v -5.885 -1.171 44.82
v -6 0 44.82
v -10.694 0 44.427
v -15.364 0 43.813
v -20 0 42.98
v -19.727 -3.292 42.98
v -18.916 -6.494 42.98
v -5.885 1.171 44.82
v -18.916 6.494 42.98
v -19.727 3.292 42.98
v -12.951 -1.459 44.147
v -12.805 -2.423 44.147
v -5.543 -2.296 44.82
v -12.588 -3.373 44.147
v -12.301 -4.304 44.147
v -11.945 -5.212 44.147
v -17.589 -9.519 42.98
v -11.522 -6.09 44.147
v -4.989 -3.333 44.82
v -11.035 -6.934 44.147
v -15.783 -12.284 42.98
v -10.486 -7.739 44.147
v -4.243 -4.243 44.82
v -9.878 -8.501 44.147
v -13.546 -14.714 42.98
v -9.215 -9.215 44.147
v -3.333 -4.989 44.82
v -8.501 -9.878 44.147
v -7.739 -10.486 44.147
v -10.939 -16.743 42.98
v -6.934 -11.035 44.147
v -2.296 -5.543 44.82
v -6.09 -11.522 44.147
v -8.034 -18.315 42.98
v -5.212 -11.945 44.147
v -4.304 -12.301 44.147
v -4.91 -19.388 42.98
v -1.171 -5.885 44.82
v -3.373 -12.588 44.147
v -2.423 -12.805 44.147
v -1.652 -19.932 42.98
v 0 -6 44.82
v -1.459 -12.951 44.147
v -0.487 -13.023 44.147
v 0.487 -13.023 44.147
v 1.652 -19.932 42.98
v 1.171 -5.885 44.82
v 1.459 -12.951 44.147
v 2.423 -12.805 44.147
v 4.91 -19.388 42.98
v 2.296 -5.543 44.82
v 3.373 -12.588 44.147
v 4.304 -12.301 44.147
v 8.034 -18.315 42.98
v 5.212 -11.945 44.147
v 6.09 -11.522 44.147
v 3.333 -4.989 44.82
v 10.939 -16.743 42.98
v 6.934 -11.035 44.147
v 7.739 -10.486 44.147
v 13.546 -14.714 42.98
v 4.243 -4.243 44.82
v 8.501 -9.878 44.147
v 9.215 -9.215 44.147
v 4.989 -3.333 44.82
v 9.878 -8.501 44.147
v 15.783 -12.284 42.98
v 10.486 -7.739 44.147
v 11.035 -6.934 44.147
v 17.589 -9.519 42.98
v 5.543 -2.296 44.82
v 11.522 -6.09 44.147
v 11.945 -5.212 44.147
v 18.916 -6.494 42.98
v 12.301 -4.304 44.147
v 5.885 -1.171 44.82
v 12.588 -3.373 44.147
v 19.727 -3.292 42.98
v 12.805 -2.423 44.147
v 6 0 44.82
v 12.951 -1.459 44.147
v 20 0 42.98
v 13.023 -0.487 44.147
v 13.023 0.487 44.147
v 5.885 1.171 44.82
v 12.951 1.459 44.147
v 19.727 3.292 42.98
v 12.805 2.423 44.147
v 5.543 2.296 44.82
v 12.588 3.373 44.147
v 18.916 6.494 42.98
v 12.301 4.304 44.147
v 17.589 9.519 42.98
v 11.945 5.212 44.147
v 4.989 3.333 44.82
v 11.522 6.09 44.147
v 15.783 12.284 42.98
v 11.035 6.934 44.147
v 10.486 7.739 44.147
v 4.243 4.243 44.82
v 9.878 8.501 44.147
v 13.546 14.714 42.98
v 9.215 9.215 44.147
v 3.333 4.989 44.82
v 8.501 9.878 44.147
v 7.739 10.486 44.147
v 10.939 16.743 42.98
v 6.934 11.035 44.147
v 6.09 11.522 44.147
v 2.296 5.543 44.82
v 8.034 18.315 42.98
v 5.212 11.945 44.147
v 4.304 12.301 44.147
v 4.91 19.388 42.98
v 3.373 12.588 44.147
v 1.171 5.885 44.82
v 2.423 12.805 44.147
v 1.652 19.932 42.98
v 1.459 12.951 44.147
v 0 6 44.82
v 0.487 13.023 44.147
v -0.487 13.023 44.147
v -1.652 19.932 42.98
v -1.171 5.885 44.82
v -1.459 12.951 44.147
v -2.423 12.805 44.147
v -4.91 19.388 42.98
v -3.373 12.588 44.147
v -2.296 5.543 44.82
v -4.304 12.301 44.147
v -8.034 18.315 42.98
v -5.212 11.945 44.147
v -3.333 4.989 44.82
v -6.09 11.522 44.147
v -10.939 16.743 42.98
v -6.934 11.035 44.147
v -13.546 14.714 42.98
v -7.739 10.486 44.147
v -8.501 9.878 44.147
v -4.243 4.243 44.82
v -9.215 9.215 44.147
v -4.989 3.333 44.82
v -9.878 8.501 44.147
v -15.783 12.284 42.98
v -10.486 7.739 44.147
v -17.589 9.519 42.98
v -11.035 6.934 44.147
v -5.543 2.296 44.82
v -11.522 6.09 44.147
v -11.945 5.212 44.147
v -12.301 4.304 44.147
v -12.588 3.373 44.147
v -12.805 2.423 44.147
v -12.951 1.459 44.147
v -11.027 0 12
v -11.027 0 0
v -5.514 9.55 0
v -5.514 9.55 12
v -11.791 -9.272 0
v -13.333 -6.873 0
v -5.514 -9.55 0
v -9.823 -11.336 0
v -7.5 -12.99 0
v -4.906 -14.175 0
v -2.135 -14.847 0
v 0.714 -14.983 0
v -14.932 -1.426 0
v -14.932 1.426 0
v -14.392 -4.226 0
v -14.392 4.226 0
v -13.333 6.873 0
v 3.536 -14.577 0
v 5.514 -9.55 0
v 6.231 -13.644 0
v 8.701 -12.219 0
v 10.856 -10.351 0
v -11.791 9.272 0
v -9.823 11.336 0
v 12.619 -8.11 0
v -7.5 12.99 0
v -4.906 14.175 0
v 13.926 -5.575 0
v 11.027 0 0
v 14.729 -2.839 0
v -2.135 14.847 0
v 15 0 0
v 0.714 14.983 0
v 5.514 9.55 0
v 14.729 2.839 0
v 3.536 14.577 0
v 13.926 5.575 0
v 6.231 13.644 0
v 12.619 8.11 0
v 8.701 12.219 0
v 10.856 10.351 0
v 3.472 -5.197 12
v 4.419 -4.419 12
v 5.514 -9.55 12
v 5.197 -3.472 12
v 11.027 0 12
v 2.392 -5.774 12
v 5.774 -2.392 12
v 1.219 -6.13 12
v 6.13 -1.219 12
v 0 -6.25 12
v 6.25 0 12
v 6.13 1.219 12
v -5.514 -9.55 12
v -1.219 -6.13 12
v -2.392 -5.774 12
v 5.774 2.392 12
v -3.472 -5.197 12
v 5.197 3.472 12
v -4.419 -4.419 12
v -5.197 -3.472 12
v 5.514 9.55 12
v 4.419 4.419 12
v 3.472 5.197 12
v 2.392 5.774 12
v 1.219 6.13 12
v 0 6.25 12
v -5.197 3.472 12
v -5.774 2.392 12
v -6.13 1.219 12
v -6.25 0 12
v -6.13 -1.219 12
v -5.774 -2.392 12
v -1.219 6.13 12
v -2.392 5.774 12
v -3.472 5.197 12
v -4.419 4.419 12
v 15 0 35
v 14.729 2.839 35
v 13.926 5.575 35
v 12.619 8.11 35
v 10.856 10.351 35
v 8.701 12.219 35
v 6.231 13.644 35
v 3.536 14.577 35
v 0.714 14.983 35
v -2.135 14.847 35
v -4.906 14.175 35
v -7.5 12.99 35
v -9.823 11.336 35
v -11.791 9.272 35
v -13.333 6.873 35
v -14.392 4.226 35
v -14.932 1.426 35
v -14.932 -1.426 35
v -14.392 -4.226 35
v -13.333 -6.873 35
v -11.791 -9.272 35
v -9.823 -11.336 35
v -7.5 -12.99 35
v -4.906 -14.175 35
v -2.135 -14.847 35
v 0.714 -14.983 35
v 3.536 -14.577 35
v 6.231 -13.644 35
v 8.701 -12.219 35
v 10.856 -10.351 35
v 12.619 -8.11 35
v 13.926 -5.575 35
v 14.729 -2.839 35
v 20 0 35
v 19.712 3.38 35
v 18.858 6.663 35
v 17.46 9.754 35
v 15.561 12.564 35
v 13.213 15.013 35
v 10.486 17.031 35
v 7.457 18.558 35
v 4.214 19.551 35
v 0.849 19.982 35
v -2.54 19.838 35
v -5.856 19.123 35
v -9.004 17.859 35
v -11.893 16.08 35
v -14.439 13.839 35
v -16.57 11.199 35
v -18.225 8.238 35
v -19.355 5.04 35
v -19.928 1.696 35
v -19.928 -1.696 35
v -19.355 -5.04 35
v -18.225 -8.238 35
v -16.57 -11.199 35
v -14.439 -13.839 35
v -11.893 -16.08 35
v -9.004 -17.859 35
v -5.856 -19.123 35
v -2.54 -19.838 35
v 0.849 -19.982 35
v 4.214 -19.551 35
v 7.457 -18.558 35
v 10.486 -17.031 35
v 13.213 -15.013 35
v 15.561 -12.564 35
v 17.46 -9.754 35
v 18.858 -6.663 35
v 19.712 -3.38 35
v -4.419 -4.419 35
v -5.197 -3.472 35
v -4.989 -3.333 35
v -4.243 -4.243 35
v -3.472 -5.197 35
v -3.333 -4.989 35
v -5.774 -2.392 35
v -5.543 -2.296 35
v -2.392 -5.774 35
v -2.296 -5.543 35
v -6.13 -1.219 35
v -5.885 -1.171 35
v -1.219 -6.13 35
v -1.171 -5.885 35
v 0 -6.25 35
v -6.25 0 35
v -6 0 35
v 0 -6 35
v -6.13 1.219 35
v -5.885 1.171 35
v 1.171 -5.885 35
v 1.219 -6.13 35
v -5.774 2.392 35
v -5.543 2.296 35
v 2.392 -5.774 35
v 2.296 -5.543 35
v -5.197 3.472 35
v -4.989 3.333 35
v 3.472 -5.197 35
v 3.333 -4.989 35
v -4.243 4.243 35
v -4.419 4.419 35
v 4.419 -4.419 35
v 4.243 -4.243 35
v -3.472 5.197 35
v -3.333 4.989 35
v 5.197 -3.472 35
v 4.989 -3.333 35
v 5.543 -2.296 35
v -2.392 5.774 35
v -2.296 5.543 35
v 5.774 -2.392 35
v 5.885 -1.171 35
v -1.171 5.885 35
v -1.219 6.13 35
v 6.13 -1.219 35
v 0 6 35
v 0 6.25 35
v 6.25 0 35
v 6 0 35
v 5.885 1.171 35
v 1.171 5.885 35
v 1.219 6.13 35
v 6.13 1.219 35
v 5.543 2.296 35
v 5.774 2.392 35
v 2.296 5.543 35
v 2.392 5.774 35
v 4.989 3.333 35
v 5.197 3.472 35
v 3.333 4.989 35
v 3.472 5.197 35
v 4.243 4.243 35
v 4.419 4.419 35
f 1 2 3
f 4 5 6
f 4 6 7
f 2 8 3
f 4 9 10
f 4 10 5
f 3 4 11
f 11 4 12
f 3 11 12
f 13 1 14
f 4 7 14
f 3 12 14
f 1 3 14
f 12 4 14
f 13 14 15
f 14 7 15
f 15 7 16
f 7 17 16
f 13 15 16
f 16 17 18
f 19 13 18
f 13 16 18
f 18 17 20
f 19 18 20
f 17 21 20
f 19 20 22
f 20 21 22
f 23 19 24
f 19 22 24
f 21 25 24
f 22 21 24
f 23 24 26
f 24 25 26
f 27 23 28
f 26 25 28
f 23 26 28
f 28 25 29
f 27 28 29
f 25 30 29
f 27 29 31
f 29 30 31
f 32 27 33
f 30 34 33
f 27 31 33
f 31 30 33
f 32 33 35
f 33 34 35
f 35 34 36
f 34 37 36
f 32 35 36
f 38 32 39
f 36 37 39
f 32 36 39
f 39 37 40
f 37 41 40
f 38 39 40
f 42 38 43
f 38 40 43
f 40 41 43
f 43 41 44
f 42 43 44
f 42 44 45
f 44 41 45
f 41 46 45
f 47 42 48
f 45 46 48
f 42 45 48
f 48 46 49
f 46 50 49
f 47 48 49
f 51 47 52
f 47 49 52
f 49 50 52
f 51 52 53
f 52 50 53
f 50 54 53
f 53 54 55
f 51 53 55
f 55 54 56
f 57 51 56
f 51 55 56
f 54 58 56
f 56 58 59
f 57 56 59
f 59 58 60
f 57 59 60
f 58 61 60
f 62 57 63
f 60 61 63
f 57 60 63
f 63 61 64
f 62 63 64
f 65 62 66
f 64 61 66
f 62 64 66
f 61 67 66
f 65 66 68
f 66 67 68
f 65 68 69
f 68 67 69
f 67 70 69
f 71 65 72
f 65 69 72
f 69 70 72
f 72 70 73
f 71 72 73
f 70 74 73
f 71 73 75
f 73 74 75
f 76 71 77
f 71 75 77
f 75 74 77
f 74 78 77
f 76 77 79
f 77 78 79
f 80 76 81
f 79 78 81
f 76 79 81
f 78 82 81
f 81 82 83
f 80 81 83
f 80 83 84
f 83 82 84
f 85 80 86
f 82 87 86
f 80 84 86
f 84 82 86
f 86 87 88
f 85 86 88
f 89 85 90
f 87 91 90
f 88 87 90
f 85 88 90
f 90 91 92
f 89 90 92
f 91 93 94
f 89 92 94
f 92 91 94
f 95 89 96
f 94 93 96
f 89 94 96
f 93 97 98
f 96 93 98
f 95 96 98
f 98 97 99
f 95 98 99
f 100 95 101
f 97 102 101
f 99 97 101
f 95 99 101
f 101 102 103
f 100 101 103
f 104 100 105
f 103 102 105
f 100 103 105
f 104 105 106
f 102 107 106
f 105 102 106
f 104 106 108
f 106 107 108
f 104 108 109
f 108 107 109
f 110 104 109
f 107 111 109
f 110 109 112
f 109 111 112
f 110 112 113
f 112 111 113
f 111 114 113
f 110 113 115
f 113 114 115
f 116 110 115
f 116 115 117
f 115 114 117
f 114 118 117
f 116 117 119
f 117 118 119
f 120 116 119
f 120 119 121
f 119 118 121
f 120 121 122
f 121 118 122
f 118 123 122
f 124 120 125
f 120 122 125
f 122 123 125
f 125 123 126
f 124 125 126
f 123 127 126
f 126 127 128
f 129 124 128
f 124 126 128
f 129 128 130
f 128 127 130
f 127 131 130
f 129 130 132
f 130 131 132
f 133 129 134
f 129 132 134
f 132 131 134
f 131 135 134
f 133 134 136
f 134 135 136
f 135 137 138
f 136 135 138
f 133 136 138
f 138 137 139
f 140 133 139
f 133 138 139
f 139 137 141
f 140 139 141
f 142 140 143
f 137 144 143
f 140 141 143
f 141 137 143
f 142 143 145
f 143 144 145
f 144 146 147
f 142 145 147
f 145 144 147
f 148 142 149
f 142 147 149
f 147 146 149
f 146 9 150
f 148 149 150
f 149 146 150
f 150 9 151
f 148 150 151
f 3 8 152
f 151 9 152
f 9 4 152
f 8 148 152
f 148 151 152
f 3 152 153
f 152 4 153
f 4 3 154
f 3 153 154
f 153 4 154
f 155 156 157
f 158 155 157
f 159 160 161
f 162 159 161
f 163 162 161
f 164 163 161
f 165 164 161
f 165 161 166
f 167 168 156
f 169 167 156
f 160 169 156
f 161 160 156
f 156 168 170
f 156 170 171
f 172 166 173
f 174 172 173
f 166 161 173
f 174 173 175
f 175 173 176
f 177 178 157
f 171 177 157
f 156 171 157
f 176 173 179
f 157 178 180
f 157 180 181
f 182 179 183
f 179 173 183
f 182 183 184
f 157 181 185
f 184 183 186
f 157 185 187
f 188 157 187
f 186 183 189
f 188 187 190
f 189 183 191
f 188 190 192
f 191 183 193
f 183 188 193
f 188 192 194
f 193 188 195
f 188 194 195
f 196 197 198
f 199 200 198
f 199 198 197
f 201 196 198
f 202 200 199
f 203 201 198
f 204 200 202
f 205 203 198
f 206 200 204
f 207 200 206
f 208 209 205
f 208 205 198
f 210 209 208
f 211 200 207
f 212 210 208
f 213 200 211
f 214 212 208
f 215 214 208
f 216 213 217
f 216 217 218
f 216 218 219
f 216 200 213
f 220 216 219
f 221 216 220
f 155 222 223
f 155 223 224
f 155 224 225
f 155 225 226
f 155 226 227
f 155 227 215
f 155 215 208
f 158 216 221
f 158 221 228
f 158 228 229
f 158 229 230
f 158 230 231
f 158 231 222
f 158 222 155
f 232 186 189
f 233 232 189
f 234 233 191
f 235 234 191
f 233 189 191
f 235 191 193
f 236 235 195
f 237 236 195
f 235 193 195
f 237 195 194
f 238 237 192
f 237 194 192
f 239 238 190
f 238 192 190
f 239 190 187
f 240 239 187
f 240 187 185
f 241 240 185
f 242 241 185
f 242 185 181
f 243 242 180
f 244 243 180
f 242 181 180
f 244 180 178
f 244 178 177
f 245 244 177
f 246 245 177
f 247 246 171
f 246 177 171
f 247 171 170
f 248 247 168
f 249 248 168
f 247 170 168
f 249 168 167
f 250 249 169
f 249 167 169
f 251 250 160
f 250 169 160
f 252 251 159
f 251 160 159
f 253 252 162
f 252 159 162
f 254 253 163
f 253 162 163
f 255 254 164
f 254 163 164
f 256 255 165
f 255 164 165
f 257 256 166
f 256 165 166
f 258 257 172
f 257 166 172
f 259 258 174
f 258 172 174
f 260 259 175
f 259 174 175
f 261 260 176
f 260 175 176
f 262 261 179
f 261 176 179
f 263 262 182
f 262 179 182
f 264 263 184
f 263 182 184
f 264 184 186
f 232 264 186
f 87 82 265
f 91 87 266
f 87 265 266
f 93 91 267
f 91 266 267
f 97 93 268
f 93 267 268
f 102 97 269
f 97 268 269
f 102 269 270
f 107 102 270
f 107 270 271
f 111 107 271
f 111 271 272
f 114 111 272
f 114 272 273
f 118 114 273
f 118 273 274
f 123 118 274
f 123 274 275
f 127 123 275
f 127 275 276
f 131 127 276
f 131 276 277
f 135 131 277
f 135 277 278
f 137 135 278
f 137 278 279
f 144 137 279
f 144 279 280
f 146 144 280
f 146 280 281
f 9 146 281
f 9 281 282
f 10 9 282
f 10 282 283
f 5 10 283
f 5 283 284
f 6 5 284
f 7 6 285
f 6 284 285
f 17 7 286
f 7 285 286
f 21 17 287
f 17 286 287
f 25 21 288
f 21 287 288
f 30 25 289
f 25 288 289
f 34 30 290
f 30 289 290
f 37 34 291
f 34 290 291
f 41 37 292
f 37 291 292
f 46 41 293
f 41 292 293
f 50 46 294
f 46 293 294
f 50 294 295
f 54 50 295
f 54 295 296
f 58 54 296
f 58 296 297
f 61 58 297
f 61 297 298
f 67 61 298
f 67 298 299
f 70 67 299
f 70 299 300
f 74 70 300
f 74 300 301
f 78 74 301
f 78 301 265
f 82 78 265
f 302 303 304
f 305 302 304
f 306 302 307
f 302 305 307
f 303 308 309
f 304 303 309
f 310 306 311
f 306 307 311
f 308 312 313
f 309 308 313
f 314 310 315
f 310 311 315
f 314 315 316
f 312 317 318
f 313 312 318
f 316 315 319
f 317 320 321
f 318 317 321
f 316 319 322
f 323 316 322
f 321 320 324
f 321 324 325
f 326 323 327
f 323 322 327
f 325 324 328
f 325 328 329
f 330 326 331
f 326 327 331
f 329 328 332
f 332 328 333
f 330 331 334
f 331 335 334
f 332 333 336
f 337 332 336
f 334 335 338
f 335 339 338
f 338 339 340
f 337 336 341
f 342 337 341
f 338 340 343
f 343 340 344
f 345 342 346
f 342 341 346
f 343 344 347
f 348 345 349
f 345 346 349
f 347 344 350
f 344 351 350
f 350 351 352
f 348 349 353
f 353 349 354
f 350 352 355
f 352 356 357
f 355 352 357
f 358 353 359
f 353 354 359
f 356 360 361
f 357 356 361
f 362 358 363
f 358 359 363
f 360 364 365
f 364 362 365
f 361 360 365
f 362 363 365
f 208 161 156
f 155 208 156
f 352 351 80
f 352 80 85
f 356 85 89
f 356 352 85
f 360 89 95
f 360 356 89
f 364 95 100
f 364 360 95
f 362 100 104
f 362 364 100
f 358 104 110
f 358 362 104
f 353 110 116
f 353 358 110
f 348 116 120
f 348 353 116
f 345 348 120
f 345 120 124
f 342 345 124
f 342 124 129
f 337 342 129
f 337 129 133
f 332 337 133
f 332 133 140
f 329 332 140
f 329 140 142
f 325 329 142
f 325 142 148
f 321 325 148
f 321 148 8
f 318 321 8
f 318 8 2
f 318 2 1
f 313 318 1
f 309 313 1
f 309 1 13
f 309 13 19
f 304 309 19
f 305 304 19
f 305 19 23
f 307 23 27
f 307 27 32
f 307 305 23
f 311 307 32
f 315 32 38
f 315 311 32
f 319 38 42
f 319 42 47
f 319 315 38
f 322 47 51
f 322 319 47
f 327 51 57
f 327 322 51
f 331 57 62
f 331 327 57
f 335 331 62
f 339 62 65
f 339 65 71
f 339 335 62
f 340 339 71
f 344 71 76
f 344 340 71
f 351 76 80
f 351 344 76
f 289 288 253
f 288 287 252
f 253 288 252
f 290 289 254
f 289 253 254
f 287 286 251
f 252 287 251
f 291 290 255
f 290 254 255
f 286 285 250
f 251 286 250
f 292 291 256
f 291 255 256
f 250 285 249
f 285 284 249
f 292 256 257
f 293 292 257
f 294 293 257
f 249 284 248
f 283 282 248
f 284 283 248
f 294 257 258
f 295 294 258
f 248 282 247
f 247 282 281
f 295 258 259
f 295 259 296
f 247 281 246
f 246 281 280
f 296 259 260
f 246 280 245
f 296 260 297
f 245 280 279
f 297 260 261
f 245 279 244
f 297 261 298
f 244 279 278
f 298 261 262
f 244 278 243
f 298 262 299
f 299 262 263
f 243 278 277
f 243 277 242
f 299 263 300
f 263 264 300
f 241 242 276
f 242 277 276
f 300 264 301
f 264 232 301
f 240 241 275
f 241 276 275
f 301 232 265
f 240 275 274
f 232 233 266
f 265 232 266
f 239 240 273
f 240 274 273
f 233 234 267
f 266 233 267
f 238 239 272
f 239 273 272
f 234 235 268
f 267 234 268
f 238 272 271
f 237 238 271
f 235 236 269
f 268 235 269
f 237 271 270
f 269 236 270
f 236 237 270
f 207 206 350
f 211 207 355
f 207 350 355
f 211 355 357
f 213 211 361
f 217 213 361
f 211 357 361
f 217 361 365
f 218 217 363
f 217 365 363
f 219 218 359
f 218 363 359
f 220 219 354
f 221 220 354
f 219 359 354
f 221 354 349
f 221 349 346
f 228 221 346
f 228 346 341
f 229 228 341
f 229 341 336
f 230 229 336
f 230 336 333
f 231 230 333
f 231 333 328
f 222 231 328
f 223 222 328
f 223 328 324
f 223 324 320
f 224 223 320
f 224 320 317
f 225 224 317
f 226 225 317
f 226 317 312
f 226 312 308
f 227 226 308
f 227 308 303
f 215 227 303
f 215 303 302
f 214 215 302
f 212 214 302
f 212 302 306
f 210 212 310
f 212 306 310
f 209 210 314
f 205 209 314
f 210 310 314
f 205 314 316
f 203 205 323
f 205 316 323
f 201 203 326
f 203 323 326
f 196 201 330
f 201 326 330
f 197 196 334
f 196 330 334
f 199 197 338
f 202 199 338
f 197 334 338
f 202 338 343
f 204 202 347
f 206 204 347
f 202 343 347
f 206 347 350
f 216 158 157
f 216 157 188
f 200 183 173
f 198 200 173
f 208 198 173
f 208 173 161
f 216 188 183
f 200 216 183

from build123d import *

# Parameters (mm, degrees)
SKETCH1_R                    = 15
BOSS_EXTRUDE1_DEPTH          = 35
CUT_EXTRUDE1_DEPTH           = 12
F_12_5_12_5_DIAMETER_HOLE1_D = 12.5
SKETCH10_R                   = 20
SKETCH10_R_2                 = 6
BOSS_EXTRUDE2_DEPTH          = 10


with BuildPart() as part:
    # Sketch1 → Boss-Extrude1 (new body)
    with BuildSketch(Plane.XY):
        Circle(SKETCH1_R)
    extrude(amount=BOSS_EXTRUDE1_DEPTH)

    # Sketch5 → Cut-Extrude1 (cut)
    with BuildSketch(Plane(origin=(0, 0, 0), x_dir=(-1, 0, 0), z_dir=(0, 0, -1))):
        Polygon((11.027390142, 0), (5.513695071, 9.55), (-5.513695071, 9.55), (-11.027390142, 0), (-5.513695071, -9.55), (5.513695071, -9.55), align=None)
    extrude(amount=-CUT_EXTRUDE1_DEPTH, mode=Mode.SUBTRACT)

    # Ø12.5 (12.5) Diameter Hole1 (through all)
    with Locations(Plane(origin=(0, 0, 12), x_dir=(-1, 0, 0), z_dir=(0, 0, -1))):
        with Locations((0, 0)):
            Hole(F_12_5_12_5_DIAMETER_HOLE1_D / 2)

    # Sketch10 → Boss-Extrude2 (add)
    with BuildSketch(Plane.XY.offset(35)):
        Circle(SKETCH10_R)
        Circle(SKETCH10_R_2, mode=Mode.SUBTRACT)
    extrude(amount=BOSS_EXTRUDE2_DEPTH)

    # Sketch11 → Cut-Revolve6 (revolve, cut)
    with BuildSketch(Plane(origin=(0, 0, 0), x_dir=(1, 0, 0), z_dir=(0, 1, 0))):
        with BuildLine():
            Line((-20, -42.979589711), (-20, -45))
            Line((-20, -45), (-6, -45))
            Line((-6, -45), (-6, -44.819837708))
            ThreePointArc((-6, -44.819837708), (-13.032521942, -44.147129922), (-20, -42.979589711))
        make_face()
    revolve(axis=Axis((0, 0, 0), (0, 0, 1)), mode=Mode.SUBTRACT)


solid = part.part
